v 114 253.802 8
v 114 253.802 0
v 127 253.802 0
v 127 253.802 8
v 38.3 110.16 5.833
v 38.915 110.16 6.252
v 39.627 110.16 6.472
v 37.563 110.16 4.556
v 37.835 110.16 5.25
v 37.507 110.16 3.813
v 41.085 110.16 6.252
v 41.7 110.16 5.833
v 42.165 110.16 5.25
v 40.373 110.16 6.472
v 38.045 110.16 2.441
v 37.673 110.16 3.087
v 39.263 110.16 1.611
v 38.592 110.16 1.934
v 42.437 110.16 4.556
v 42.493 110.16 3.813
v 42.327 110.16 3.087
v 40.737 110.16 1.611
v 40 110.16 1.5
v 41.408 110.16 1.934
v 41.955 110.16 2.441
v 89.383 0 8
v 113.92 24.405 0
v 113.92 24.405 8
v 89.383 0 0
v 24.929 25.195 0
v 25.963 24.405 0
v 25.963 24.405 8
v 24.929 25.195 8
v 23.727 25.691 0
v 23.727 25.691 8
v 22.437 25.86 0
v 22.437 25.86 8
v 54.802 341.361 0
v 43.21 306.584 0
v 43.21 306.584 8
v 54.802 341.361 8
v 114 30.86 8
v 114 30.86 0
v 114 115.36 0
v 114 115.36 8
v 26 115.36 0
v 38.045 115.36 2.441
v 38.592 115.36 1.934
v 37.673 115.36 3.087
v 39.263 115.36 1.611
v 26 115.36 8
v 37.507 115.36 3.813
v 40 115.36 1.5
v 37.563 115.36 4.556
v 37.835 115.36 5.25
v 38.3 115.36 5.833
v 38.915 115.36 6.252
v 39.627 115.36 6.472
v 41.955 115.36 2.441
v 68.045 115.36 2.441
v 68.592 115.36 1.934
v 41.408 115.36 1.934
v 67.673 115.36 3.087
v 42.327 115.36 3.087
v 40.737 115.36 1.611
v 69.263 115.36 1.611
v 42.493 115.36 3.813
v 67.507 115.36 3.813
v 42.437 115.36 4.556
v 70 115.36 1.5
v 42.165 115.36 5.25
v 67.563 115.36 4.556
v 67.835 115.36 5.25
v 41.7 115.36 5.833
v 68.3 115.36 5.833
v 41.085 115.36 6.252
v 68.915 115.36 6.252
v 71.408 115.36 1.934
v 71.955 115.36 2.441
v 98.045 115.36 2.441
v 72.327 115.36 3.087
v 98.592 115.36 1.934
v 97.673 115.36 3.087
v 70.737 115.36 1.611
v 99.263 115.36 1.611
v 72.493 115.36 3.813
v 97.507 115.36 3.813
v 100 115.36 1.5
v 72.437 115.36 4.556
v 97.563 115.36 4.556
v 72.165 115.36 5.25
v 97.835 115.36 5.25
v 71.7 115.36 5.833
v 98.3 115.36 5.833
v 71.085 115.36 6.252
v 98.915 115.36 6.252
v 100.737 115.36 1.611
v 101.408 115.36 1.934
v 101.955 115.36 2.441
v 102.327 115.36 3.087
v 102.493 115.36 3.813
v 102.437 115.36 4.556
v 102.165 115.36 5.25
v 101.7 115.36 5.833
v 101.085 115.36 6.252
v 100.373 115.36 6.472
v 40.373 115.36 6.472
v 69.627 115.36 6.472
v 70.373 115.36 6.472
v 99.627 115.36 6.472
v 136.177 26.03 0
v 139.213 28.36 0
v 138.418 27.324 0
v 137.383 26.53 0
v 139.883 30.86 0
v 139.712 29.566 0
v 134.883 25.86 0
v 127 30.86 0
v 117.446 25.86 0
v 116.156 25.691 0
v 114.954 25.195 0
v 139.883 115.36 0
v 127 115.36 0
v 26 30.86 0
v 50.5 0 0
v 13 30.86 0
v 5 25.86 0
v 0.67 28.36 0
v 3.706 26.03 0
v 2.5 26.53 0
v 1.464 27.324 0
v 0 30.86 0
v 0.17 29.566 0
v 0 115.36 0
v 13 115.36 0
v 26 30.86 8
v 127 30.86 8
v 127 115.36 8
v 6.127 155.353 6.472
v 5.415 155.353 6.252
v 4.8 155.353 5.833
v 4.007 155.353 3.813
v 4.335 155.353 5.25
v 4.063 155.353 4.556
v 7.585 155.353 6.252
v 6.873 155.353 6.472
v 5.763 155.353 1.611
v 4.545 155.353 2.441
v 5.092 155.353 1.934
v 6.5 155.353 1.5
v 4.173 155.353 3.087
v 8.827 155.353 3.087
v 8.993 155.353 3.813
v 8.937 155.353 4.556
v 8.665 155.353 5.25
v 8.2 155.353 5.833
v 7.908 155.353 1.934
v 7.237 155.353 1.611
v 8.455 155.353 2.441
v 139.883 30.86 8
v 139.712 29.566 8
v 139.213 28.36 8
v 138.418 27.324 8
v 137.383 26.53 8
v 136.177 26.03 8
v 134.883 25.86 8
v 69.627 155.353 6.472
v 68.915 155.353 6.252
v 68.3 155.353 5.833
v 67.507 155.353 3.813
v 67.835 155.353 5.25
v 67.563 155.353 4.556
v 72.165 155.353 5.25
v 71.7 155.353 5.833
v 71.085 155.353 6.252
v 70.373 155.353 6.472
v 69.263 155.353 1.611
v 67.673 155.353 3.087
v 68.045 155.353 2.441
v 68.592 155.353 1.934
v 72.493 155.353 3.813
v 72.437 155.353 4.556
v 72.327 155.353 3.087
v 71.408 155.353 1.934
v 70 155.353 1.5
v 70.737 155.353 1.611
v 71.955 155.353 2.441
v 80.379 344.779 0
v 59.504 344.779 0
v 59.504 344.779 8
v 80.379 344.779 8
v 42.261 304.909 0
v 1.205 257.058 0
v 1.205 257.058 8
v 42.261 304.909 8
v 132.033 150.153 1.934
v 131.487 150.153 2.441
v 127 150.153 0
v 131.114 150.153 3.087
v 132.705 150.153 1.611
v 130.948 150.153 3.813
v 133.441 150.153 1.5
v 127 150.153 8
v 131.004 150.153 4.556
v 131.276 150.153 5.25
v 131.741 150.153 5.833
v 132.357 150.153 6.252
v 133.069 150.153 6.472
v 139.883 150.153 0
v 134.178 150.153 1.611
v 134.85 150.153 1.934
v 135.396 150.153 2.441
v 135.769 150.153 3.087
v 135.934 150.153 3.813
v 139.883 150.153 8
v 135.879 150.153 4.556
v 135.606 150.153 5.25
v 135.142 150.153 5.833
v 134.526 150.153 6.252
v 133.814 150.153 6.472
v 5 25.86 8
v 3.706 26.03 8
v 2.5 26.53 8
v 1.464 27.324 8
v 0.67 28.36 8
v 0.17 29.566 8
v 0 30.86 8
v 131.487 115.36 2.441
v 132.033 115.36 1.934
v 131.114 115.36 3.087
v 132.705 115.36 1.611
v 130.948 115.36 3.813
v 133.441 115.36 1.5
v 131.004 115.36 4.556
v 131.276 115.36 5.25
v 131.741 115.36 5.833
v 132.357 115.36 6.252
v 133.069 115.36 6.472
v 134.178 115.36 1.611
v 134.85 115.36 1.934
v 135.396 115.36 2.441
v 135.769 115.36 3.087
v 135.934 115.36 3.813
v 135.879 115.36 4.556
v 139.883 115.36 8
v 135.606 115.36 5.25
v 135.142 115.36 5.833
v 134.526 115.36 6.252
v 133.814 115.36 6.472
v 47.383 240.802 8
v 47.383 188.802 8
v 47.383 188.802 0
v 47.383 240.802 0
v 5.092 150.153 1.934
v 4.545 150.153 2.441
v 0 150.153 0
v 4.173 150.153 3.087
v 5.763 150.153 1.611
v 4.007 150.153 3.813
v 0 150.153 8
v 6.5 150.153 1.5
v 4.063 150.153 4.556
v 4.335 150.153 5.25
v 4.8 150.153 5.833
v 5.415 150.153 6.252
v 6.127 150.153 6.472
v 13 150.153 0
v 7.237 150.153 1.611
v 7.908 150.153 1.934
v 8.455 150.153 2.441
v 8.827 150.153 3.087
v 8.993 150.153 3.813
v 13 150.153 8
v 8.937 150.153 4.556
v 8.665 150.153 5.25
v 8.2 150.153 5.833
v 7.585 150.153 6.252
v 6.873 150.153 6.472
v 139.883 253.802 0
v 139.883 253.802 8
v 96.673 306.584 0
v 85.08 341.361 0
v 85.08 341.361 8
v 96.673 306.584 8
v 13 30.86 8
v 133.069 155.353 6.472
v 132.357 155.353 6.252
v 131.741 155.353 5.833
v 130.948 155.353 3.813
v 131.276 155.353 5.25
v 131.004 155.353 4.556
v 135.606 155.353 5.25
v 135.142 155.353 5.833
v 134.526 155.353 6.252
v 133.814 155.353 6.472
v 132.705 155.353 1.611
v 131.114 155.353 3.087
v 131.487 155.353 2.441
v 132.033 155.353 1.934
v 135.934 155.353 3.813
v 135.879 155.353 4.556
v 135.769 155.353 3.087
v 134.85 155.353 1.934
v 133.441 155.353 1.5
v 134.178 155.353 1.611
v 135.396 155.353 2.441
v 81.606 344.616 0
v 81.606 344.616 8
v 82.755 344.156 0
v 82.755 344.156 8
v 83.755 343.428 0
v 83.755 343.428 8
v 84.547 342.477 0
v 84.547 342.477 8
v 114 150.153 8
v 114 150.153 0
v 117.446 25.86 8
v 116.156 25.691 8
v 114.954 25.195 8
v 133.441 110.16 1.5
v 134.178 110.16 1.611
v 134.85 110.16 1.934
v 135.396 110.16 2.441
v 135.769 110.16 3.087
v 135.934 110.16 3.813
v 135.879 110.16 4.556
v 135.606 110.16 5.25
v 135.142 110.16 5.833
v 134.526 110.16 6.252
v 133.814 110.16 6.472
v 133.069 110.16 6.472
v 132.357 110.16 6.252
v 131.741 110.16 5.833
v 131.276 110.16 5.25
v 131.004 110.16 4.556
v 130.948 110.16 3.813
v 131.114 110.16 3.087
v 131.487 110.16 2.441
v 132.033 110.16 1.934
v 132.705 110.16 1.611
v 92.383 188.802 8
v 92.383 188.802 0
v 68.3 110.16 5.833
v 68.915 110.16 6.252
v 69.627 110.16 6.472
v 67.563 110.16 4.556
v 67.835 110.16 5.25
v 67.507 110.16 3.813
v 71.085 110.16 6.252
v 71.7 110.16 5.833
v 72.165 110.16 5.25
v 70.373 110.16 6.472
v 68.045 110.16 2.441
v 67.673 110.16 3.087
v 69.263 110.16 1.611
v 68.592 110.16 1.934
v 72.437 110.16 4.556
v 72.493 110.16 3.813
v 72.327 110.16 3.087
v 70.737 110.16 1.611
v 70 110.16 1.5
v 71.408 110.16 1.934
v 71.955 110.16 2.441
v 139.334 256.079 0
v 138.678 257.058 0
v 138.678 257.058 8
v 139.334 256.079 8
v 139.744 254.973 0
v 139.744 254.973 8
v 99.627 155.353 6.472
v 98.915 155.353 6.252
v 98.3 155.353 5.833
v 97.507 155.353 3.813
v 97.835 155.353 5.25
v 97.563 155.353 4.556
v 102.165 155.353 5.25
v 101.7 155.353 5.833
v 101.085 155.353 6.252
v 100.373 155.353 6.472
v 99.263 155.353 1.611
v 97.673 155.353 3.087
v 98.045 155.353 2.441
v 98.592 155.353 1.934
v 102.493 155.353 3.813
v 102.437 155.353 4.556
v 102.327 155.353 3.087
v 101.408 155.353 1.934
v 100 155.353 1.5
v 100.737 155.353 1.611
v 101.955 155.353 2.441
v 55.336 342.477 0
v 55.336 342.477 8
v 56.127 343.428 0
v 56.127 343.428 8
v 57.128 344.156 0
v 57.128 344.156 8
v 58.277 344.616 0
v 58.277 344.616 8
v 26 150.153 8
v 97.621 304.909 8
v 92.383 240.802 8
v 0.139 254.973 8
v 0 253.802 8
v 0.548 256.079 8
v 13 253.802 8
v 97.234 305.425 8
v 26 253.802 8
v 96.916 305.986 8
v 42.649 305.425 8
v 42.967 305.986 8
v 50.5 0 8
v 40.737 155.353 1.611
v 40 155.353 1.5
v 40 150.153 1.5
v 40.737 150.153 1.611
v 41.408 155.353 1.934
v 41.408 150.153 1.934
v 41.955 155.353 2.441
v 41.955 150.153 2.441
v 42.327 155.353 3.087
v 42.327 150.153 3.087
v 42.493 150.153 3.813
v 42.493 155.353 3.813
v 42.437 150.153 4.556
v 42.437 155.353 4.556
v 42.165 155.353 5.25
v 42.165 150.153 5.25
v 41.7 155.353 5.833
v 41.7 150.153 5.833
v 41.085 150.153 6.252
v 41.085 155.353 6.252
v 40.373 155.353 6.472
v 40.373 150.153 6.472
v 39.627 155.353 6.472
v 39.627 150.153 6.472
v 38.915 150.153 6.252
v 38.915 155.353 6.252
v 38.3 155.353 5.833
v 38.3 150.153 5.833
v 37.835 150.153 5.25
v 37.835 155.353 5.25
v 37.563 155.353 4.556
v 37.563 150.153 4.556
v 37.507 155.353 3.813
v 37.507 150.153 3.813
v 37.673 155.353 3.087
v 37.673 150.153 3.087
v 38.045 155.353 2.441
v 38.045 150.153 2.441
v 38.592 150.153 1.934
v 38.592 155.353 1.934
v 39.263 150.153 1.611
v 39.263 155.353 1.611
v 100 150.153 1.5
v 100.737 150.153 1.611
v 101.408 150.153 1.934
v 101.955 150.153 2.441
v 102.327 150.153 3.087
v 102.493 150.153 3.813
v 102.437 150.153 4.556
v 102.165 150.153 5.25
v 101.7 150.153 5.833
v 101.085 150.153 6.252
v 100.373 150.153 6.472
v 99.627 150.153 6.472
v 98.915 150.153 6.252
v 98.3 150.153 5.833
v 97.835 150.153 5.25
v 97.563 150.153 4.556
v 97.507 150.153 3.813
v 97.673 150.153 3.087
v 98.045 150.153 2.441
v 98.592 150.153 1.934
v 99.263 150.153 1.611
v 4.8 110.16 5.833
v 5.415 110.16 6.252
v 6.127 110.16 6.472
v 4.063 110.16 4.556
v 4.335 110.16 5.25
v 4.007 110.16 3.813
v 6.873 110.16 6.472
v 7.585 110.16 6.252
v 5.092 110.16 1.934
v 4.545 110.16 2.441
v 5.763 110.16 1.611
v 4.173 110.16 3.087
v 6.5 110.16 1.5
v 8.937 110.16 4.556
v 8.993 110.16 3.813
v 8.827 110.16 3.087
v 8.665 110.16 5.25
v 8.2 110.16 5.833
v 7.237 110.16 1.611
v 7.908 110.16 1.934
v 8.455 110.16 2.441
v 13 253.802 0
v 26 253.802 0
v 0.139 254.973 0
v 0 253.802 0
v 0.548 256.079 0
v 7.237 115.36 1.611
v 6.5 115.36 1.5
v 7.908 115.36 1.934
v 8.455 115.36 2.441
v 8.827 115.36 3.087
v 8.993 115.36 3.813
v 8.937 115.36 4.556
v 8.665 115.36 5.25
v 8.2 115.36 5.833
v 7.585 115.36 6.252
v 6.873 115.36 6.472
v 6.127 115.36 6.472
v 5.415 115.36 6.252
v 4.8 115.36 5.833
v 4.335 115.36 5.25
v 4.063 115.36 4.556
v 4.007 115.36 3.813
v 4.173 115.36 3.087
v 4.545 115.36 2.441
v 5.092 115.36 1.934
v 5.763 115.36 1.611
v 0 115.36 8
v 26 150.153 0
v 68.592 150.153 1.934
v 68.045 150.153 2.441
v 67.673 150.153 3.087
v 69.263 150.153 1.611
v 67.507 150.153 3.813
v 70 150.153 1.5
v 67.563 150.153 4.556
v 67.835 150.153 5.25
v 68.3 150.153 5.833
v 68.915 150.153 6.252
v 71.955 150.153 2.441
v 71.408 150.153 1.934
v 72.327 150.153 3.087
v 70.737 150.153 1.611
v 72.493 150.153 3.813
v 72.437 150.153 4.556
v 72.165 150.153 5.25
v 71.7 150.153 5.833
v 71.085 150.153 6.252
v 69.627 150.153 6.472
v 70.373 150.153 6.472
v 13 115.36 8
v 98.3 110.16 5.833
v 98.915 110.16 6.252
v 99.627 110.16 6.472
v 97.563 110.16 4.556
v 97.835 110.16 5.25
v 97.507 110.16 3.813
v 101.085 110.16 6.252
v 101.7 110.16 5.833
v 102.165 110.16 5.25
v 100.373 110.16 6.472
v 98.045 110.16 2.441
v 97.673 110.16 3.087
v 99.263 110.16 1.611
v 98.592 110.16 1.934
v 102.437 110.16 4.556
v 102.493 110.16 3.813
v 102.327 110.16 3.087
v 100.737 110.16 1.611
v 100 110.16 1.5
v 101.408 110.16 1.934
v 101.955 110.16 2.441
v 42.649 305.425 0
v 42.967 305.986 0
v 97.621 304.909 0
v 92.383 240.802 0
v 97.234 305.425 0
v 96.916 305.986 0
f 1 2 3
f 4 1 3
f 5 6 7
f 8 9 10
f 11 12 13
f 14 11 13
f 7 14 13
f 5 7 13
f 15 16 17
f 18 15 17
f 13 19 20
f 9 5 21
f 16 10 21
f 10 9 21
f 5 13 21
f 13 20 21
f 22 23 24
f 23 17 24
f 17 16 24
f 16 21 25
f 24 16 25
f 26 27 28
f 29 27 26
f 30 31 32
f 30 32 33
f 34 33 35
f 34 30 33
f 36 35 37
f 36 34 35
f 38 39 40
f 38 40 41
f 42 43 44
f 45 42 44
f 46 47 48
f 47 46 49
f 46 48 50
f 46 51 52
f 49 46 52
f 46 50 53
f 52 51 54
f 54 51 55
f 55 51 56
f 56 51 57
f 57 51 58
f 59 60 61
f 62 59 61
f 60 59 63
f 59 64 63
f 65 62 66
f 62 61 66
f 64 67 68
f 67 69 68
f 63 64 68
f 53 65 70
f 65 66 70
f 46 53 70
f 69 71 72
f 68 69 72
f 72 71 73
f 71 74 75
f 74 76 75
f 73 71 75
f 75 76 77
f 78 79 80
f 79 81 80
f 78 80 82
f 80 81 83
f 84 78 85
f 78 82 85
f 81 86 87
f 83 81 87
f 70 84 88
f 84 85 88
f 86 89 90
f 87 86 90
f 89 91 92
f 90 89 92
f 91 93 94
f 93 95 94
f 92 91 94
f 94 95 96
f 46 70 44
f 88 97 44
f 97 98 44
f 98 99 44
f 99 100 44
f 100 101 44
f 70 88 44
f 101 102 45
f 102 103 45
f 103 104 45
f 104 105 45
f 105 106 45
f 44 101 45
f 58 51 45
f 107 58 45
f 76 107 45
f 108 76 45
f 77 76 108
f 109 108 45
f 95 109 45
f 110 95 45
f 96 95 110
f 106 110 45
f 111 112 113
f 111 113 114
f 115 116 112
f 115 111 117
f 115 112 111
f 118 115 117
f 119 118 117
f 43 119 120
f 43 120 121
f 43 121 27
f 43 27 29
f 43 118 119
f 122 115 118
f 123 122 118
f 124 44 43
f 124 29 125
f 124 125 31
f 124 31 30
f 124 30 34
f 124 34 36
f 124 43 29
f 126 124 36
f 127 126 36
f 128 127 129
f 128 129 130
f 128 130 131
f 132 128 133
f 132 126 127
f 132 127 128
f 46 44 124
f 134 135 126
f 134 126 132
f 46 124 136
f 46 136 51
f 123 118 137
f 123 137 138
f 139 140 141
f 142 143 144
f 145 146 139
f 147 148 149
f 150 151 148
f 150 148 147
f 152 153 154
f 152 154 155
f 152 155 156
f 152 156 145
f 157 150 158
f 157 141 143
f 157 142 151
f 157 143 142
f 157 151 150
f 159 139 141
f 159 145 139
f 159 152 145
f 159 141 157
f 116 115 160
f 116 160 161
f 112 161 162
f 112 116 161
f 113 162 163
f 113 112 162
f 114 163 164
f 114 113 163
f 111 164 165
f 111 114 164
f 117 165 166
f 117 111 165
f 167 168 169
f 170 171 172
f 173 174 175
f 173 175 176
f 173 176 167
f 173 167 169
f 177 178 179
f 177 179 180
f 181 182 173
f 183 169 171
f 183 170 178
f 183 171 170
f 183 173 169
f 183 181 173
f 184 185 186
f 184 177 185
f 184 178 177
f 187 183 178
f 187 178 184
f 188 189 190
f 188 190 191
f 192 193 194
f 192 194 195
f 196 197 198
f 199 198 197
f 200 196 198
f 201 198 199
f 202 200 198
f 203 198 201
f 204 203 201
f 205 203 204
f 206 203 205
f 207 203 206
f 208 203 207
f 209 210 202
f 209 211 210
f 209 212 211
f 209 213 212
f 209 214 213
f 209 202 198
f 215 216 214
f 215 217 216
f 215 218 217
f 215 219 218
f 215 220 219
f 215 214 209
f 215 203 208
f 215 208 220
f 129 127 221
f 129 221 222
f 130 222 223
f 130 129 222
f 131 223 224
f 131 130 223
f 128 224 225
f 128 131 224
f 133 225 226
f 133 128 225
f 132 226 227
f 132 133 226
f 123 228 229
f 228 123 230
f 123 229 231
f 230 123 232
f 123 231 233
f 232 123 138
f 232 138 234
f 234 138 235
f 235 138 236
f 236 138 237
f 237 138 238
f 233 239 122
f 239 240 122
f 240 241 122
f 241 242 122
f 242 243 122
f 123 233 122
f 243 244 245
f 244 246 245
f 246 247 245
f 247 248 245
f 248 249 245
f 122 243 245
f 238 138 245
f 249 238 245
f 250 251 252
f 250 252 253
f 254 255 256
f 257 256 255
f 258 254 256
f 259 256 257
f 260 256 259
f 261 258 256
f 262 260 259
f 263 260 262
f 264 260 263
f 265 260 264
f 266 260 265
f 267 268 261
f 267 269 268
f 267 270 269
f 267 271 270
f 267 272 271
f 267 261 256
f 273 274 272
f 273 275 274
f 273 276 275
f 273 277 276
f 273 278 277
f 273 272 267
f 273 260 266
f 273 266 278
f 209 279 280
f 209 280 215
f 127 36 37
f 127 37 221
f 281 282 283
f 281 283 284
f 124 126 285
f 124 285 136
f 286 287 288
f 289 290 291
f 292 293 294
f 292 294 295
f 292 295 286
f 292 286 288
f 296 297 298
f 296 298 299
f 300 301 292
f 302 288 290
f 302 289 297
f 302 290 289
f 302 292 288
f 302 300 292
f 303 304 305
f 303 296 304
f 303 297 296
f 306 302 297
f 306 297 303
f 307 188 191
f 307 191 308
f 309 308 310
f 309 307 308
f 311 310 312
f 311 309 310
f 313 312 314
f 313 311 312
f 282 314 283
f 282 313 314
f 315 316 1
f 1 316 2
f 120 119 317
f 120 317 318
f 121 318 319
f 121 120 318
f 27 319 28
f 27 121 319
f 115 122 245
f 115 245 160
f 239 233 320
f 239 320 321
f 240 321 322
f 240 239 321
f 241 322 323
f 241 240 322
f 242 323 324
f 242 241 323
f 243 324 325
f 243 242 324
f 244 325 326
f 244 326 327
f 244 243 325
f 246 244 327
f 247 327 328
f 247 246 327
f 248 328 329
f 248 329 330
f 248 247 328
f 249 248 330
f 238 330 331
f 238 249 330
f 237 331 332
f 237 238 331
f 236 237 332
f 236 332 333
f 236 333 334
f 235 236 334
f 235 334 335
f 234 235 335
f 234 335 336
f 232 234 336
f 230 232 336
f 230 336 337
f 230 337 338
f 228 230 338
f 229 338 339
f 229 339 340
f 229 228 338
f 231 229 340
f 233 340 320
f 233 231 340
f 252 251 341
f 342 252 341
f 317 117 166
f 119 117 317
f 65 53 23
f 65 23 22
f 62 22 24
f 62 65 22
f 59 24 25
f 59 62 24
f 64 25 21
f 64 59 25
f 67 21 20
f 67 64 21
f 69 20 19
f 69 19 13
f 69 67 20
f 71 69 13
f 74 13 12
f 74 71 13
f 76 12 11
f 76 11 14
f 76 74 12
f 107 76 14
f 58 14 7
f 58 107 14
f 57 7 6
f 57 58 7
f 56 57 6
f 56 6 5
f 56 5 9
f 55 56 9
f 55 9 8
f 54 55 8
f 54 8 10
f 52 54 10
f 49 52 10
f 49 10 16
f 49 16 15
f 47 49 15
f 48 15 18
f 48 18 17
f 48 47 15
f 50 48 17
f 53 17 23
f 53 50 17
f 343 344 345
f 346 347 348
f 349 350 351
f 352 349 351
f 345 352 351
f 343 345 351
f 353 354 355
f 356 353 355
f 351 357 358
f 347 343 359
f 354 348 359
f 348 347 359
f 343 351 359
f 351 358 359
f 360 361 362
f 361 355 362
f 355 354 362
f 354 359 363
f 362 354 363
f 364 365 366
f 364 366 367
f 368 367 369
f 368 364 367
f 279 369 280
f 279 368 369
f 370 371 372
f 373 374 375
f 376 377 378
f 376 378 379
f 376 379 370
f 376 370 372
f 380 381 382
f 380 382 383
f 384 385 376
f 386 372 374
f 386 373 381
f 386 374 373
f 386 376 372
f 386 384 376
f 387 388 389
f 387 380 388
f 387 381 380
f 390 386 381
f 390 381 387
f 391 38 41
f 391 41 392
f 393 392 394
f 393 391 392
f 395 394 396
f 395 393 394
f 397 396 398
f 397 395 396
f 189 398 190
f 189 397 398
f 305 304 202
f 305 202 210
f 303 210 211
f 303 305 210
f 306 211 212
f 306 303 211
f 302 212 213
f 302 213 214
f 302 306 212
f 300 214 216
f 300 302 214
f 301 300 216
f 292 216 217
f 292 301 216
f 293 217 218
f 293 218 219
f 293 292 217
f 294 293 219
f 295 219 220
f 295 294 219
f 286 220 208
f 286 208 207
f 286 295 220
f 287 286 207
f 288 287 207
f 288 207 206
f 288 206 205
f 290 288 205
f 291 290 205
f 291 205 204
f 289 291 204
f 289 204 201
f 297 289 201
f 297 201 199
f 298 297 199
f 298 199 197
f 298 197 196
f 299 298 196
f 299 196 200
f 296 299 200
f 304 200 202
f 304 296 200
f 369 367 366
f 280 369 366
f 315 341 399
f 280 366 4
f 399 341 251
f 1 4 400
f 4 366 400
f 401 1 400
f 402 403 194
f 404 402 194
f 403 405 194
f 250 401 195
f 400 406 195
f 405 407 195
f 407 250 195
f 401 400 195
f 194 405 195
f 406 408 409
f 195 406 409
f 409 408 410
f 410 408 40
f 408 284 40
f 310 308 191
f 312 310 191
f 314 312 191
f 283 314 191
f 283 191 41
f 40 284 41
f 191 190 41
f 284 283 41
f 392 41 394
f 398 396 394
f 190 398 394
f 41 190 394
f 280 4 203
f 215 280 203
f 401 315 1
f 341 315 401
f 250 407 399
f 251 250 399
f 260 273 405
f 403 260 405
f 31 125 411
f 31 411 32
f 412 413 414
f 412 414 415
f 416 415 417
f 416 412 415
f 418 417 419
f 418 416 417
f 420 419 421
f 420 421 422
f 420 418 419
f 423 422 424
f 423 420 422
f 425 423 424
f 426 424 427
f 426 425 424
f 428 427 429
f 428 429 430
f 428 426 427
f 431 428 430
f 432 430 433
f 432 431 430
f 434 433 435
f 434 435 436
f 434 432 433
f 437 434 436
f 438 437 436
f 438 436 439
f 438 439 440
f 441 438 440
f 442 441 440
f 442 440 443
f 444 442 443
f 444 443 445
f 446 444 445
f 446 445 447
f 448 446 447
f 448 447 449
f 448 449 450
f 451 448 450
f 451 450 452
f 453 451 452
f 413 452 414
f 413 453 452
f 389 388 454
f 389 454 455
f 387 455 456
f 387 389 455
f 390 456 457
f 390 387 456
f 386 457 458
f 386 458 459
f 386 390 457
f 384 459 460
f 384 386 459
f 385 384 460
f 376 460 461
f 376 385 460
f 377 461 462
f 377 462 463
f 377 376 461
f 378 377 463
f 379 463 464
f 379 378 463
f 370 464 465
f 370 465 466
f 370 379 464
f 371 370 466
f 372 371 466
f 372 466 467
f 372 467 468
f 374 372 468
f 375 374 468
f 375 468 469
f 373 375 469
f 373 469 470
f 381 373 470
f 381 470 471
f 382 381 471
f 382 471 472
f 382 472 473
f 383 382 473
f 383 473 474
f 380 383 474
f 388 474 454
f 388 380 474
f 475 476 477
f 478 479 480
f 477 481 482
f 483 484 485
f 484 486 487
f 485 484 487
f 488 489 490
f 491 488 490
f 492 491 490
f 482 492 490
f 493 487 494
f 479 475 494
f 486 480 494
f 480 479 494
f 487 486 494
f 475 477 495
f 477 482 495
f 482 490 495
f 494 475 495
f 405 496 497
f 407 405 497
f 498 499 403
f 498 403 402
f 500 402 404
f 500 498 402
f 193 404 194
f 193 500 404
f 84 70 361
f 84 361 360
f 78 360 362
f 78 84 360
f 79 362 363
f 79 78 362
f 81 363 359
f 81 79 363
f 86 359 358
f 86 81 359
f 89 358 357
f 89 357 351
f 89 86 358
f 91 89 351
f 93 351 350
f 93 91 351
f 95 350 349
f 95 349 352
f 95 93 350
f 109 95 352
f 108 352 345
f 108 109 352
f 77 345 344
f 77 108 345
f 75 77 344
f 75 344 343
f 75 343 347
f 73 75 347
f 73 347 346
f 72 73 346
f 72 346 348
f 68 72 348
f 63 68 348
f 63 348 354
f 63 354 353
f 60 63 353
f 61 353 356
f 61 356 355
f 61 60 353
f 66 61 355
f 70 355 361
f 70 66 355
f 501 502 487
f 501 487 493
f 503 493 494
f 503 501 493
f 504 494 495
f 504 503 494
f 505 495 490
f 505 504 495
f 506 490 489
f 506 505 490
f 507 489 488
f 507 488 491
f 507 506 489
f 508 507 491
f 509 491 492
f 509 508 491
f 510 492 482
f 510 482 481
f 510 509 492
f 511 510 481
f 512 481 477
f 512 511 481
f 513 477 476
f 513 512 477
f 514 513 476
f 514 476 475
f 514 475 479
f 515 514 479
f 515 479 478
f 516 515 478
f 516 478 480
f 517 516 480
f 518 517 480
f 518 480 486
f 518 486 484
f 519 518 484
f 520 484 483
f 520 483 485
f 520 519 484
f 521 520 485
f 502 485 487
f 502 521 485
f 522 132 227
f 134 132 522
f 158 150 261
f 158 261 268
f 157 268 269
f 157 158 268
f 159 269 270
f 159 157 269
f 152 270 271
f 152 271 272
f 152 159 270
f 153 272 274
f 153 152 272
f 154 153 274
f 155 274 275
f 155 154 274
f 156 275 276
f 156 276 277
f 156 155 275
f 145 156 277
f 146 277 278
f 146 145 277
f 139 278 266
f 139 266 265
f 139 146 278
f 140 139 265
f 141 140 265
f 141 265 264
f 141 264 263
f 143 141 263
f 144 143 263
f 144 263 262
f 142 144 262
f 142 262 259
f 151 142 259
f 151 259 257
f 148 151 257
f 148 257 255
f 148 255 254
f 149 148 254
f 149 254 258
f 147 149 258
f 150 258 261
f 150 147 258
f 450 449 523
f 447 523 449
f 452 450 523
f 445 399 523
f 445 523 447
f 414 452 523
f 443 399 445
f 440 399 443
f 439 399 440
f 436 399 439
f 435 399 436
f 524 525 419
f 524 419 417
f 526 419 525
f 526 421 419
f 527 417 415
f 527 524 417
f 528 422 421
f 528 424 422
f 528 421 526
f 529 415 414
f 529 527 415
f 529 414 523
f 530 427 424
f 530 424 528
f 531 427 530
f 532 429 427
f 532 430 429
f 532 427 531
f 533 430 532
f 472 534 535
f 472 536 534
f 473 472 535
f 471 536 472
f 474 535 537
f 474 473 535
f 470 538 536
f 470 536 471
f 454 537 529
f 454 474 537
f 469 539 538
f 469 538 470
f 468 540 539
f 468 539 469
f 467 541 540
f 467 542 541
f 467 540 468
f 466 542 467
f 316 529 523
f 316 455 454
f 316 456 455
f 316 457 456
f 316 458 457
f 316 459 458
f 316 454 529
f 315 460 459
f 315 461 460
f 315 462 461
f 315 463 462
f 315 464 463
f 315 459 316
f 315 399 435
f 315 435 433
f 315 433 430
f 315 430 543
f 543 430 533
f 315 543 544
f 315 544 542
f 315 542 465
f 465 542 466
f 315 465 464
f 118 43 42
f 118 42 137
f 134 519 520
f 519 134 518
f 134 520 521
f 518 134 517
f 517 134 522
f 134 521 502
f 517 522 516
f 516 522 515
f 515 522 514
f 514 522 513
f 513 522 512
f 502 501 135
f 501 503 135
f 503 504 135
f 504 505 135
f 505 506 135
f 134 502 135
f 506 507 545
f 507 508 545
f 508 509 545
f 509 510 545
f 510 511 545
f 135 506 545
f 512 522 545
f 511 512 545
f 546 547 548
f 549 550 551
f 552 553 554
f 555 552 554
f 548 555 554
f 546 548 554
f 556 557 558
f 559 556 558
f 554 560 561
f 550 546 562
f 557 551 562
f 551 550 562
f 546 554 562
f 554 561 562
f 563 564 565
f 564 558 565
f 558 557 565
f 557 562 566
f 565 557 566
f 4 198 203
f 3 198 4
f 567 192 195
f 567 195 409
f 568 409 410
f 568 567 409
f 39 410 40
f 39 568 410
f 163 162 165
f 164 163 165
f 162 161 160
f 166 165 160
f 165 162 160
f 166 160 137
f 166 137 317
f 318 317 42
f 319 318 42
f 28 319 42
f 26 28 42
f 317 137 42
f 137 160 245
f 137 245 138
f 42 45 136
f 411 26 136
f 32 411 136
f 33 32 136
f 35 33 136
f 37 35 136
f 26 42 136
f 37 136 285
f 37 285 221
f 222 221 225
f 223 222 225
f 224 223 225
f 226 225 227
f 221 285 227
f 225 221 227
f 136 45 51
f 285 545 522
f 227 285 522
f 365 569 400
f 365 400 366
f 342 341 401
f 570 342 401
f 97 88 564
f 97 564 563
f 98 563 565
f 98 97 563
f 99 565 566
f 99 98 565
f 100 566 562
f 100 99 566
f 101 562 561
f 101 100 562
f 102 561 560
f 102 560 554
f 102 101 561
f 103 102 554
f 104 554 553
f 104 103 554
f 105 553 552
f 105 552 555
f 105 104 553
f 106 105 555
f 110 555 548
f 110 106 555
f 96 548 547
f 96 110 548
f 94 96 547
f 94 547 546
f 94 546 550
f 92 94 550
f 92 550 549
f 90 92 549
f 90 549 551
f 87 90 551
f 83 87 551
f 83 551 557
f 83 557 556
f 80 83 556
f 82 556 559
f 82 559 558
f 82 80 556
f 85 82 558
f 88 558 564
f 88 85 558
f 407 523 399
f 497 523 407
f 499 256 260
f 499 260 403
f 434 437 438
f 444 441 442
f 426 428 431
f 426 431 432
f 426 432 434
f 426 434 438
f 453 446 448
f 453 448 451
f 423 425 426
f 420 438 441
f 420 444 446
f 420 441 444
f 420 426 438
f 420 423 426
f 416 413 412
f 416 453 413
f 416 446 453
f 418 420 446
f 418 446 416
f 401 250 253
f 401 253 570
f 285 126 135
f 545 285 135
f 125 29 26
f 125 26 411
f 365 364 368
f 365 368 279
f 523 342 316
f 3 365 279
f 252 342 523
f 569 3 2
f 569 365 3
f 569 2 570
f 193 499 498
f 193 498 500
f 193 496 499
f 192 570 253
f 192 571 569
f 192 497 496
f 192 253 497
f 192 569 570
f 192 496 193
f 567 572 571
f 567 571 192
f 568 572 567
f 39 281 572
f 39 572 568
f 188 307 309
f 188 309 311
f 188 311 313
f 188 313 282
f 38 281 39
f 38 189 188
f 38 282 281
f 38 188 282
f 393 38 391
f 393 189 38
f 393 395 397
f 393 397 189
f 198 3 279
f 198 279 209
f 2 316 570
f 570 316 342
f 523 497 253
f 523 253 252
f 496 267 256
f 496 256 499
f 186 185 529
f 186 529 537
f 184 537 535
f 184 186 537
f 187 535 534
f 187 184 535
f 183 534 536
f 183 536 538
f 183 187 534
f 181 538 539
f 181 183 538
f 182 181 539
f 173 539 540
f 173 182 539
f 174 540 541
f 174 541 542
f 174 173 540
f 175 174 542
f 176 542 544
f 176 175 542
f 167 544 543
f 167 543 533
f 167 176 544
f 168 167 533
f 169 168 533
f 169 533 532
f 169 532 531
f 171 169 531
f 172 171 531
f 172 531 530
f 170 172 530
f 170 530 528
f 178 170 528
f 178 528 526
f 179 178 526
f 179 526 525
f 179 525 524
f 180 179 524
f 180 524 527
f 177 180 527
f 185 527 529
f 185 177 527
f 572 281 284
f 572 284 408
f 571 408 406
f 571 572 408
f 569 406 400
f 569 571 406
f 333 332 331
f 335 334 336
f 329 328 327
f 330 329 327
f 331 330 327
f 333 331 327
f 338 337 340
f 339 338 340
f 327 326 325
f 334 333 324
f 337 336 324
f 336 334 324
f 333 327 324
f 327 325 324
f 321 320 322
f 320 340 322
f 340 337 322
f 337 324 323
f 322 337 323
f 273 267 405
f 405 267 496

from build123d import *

# Parameters (mm, degrees)
SKETCH1_W              = 13
SKETCH1_H              = 188.148975749
BOSS_EXTRUDE1_DEPTH    = 8
SKETCH2_W              = 45
SKETCH2_H              = 52
CUT_EXTRUDE1_DEPTH     = 341.17998495
SPLIT1_SURFACE_1_BACK  = 341.18
SPLIT1_SURFACE_1_DEPTH = 682.36
SPLIT1_SURFACE_2_BACK  = 341.18
SPLIT1_SURFACE_2_DEPTH = 682.36
SKETCH5_R              = 2.5
CUT_EXTRUDE6_DEPTH     = 5.2
CUT_EXTRUDE7_START     = -5.2
SKETCH4_R              = 2.5
CUT_EXTRUDE7_DEPTH     = 5.2


with BuildPart() as part:
    # Sketch1 → Boss-Extrude1 (new body)
    with BuildSketch(Plane.XY):
        with BuildLine():
            Line((0, 30.859943174), (0, 219.008918923))
            ThreePointArc((0, 219.008918923), (0.311003468, 220.744808182), (1.205324608, 222.264750409))
            Line((1.205324608, 222.264750409), (42.261389271, 270.115641625))
            ThreePointArc((42.261389271, 270.115641625), (42.81710491, 270.906904614), (43.210130369, 271.790334282))
            Line((43.210130369, 271.790334282), (54.802396658, 306.567133147))
            ThreePointArc((54.802396658, 306.567133147), (56.605292439, 309.029920375), (59.503914938, 309.985818768))
            Line((59.503914938, 309.985818768), (80.378944352, 309.985818768))
            ThreePointArc((80.378944352, 309.985818768), (83.277566851, 309.029920375), (85.080462632, 306.567133147))
            Line((85.080462632, 306.567133147), (96.672728921, 271.790334282))
            ThreePointArc((96.672728921, 271.790334282), (97.06575438, 270.906904614), (97.621470019, 270.115641625))
            Line((97.621470019, 270.115641625), (138.677534682, 222.264750409))
            ThreePointArc((138.677534682, 222.264750409), (139.571855822, 220.744808182), (139.88285929, 219.008918923))
            Line((139.88285929, 219.008918923), (139.88285929, 30.859943174))
            ThreePointArc((139.88285929, 30.859943174), (138.418393196, 27.324409268), (134.88285929, 25.859943174))
            Line((134.88285929, 25.859943174), (117.446021446, 25.859943174))
            ThreePointArc((117.446021446, 25.859943174), (115.538843756, 25.481920377), (113.920048724, 24.405012478))
            Line((113.920048724, 24.405012478), (89.38285929, 0))
            Line((89.38285929, 0), (50.5, 0))
            Line((50.5, 0), (25.962810565, 24.405012478))
            ThreePointArc((25.962810565, 24.405012478), (24.344015534, 25.481920377), (22.436837844, 25.859943174))
            Line((22.436837844, 25.859943174), (5, 25.859943174))
            ThreePointArc((5, 25.859943174), (1.464466094, 27.324409268), (0, 30.859943174))
        make_face()
        with Locations((19.5, 124.934431049)):
            Rectangle(SKETCH1_W, SKETCH1_H, mode=Mode.SUBTRACT)
        with Locations((120.5, 124.934431049)):
            Rectangle(SKETCH1_W, SKETCH1_H, mode=Mode.SUBTRACT)
    extrude(amount=BOSS_EXTRUDE1_DEPTH)

    # Sketch2 → Cut-Extrude1 (cut, through all)
    with BuildSketch(Plane.XY.offset(8)):
        with Locations((69.88285929, 180.008918923)):
            Rectangle(SKETCH2_W, SKETCH2_H)
    extrude(amount=-CUT_EXTRUDE1_DEPTH, mode=Mode.SUBTRACT)


with BuildPart() as body_2:
    # Split1: the piece behind the surface
    add(part.part)
    # Split1 surface: a surface, the sketch's curves swept straight by 682.36 mm
    with BuildLine(Plane(origin=(0, 0, 0), x_dir=(-1, 0, 0), z_dir=(0, 0, -1)).offset(-SPLIT1_SURFACE_1_BACK), mode=Mode.PRIVATE) as split1_surface_1_path:
        Line((0, 115.359943174), (-139.88285929, 115.359943174))
    split1_surface_1 = Shell.extrude(split1_surface_1_path.wire(), (0 * SPLIT1_SURFACE_1_DEPTH, 0 * SPLIT1_SURFACE_1_DEPTH, -1 * SPLIT1_SURFACE_1_DEPTH))
    split(bisect_by=split1_surface_1, keep=Keep.BOTTOM)


with BuildPart() as part_1:
    add(part.part)

    # Split1: split by a surface, the side it looks to stays
    # Split1 surface: a surface, the sketch's curves swept straight by 682.36 mm
    with BuildLine(Plane(origin=(0, 0, 0), x_dir=(-1, 0, 0), z_dir=(0, 0, -1)).offset(-SPLIT1_SURFACE_2_BACK), mode=Mode.PRIVATE) as split1_surface_2_path:
        Line((0, 115.359943174), (-139.88285929, 115.359943174))
    split1_surface_2 = Shell.extrude(split1_surface_2_path.wire(), (0 * SPLIT1_SURFACE_2_DEPTH, 0 * SPLIT1_SURFACE_2_DEPTH, -1 * SPLIT1_SURFACE_2_DEPTH))
    split(bisect_by=split1_surface_2, keep=Keep.TOP)

    # Sketch5 → Cut-Extrude6 (cut)
    with BuildSketch(Plane(origin=(0, 115.359943174, -115.359943174), x_dir=(1, 0, 0), z_dir=(0, -1, 0))):
        with Locations(Location((133.441429645, 119.359943174, 0), (0, 0, 270))):
            Circle(SKETCH5_R)
        with Locations(Location((70, 119.359943174, 0), (0, 0, 270))):
            Circle(SKETCH5_R)
        with Locations(Location((100, 119.359943174, 0), (0, 0, 270))):
            Circle(SKETCH5_R)
        with Locations(Location((40, 119.359943174, 0), (0, 0, 270))):
            Circle(SKETCH5_R)
        with Locations(Location((6.5, 119.359943174, 0), (0, 0, 270))):
            Circle(SKETCH5_R)
    extrude(amount=CUT_EXTRUDE6_DEPTH, mode=Mode.SUBTRACT)


with BuildPart() as body_2_1:
    # Body-Move/Copy1: moved
    add(body_2.part.moved(Location((0, 34.793425009, 0))))

    # Sketch4 → Cut-Extrude7 (cut)
    with BuildSketch(Plane(origin=(0, 150.153368183, 0), x_dir=(-1, 0, 0), z_dir=(0, -1, 0)).offset(CUT_EXTRUDE7_START)):
        with Locations(Location((-6.5, -4, 0), (0, 0, 90))):
            Circle(SKETCH4_R)
        with Locations(Location((-70, -4, 0), (0, 0, 90))):
            Circle(SKETCH4_R)
        with Locations(Location((-40, -4, 0), (0, 0, 90))):
            Circle(SKETCH4_R)
        with Locations(Location((-100, -4, 0), (0, 0, 90))):
            Circle(SKETCH4_R)
        with Locations(Location((-133.441429645, -4, 0), (0, 0, 90))):
            Circle(SKETCH4_R)
    extrude(amount=CUT_EXTRUDE7_DEPTH, mode=Mode.SUBTRACT)


solid = Compound([part_1.part, body_2_1.part])
